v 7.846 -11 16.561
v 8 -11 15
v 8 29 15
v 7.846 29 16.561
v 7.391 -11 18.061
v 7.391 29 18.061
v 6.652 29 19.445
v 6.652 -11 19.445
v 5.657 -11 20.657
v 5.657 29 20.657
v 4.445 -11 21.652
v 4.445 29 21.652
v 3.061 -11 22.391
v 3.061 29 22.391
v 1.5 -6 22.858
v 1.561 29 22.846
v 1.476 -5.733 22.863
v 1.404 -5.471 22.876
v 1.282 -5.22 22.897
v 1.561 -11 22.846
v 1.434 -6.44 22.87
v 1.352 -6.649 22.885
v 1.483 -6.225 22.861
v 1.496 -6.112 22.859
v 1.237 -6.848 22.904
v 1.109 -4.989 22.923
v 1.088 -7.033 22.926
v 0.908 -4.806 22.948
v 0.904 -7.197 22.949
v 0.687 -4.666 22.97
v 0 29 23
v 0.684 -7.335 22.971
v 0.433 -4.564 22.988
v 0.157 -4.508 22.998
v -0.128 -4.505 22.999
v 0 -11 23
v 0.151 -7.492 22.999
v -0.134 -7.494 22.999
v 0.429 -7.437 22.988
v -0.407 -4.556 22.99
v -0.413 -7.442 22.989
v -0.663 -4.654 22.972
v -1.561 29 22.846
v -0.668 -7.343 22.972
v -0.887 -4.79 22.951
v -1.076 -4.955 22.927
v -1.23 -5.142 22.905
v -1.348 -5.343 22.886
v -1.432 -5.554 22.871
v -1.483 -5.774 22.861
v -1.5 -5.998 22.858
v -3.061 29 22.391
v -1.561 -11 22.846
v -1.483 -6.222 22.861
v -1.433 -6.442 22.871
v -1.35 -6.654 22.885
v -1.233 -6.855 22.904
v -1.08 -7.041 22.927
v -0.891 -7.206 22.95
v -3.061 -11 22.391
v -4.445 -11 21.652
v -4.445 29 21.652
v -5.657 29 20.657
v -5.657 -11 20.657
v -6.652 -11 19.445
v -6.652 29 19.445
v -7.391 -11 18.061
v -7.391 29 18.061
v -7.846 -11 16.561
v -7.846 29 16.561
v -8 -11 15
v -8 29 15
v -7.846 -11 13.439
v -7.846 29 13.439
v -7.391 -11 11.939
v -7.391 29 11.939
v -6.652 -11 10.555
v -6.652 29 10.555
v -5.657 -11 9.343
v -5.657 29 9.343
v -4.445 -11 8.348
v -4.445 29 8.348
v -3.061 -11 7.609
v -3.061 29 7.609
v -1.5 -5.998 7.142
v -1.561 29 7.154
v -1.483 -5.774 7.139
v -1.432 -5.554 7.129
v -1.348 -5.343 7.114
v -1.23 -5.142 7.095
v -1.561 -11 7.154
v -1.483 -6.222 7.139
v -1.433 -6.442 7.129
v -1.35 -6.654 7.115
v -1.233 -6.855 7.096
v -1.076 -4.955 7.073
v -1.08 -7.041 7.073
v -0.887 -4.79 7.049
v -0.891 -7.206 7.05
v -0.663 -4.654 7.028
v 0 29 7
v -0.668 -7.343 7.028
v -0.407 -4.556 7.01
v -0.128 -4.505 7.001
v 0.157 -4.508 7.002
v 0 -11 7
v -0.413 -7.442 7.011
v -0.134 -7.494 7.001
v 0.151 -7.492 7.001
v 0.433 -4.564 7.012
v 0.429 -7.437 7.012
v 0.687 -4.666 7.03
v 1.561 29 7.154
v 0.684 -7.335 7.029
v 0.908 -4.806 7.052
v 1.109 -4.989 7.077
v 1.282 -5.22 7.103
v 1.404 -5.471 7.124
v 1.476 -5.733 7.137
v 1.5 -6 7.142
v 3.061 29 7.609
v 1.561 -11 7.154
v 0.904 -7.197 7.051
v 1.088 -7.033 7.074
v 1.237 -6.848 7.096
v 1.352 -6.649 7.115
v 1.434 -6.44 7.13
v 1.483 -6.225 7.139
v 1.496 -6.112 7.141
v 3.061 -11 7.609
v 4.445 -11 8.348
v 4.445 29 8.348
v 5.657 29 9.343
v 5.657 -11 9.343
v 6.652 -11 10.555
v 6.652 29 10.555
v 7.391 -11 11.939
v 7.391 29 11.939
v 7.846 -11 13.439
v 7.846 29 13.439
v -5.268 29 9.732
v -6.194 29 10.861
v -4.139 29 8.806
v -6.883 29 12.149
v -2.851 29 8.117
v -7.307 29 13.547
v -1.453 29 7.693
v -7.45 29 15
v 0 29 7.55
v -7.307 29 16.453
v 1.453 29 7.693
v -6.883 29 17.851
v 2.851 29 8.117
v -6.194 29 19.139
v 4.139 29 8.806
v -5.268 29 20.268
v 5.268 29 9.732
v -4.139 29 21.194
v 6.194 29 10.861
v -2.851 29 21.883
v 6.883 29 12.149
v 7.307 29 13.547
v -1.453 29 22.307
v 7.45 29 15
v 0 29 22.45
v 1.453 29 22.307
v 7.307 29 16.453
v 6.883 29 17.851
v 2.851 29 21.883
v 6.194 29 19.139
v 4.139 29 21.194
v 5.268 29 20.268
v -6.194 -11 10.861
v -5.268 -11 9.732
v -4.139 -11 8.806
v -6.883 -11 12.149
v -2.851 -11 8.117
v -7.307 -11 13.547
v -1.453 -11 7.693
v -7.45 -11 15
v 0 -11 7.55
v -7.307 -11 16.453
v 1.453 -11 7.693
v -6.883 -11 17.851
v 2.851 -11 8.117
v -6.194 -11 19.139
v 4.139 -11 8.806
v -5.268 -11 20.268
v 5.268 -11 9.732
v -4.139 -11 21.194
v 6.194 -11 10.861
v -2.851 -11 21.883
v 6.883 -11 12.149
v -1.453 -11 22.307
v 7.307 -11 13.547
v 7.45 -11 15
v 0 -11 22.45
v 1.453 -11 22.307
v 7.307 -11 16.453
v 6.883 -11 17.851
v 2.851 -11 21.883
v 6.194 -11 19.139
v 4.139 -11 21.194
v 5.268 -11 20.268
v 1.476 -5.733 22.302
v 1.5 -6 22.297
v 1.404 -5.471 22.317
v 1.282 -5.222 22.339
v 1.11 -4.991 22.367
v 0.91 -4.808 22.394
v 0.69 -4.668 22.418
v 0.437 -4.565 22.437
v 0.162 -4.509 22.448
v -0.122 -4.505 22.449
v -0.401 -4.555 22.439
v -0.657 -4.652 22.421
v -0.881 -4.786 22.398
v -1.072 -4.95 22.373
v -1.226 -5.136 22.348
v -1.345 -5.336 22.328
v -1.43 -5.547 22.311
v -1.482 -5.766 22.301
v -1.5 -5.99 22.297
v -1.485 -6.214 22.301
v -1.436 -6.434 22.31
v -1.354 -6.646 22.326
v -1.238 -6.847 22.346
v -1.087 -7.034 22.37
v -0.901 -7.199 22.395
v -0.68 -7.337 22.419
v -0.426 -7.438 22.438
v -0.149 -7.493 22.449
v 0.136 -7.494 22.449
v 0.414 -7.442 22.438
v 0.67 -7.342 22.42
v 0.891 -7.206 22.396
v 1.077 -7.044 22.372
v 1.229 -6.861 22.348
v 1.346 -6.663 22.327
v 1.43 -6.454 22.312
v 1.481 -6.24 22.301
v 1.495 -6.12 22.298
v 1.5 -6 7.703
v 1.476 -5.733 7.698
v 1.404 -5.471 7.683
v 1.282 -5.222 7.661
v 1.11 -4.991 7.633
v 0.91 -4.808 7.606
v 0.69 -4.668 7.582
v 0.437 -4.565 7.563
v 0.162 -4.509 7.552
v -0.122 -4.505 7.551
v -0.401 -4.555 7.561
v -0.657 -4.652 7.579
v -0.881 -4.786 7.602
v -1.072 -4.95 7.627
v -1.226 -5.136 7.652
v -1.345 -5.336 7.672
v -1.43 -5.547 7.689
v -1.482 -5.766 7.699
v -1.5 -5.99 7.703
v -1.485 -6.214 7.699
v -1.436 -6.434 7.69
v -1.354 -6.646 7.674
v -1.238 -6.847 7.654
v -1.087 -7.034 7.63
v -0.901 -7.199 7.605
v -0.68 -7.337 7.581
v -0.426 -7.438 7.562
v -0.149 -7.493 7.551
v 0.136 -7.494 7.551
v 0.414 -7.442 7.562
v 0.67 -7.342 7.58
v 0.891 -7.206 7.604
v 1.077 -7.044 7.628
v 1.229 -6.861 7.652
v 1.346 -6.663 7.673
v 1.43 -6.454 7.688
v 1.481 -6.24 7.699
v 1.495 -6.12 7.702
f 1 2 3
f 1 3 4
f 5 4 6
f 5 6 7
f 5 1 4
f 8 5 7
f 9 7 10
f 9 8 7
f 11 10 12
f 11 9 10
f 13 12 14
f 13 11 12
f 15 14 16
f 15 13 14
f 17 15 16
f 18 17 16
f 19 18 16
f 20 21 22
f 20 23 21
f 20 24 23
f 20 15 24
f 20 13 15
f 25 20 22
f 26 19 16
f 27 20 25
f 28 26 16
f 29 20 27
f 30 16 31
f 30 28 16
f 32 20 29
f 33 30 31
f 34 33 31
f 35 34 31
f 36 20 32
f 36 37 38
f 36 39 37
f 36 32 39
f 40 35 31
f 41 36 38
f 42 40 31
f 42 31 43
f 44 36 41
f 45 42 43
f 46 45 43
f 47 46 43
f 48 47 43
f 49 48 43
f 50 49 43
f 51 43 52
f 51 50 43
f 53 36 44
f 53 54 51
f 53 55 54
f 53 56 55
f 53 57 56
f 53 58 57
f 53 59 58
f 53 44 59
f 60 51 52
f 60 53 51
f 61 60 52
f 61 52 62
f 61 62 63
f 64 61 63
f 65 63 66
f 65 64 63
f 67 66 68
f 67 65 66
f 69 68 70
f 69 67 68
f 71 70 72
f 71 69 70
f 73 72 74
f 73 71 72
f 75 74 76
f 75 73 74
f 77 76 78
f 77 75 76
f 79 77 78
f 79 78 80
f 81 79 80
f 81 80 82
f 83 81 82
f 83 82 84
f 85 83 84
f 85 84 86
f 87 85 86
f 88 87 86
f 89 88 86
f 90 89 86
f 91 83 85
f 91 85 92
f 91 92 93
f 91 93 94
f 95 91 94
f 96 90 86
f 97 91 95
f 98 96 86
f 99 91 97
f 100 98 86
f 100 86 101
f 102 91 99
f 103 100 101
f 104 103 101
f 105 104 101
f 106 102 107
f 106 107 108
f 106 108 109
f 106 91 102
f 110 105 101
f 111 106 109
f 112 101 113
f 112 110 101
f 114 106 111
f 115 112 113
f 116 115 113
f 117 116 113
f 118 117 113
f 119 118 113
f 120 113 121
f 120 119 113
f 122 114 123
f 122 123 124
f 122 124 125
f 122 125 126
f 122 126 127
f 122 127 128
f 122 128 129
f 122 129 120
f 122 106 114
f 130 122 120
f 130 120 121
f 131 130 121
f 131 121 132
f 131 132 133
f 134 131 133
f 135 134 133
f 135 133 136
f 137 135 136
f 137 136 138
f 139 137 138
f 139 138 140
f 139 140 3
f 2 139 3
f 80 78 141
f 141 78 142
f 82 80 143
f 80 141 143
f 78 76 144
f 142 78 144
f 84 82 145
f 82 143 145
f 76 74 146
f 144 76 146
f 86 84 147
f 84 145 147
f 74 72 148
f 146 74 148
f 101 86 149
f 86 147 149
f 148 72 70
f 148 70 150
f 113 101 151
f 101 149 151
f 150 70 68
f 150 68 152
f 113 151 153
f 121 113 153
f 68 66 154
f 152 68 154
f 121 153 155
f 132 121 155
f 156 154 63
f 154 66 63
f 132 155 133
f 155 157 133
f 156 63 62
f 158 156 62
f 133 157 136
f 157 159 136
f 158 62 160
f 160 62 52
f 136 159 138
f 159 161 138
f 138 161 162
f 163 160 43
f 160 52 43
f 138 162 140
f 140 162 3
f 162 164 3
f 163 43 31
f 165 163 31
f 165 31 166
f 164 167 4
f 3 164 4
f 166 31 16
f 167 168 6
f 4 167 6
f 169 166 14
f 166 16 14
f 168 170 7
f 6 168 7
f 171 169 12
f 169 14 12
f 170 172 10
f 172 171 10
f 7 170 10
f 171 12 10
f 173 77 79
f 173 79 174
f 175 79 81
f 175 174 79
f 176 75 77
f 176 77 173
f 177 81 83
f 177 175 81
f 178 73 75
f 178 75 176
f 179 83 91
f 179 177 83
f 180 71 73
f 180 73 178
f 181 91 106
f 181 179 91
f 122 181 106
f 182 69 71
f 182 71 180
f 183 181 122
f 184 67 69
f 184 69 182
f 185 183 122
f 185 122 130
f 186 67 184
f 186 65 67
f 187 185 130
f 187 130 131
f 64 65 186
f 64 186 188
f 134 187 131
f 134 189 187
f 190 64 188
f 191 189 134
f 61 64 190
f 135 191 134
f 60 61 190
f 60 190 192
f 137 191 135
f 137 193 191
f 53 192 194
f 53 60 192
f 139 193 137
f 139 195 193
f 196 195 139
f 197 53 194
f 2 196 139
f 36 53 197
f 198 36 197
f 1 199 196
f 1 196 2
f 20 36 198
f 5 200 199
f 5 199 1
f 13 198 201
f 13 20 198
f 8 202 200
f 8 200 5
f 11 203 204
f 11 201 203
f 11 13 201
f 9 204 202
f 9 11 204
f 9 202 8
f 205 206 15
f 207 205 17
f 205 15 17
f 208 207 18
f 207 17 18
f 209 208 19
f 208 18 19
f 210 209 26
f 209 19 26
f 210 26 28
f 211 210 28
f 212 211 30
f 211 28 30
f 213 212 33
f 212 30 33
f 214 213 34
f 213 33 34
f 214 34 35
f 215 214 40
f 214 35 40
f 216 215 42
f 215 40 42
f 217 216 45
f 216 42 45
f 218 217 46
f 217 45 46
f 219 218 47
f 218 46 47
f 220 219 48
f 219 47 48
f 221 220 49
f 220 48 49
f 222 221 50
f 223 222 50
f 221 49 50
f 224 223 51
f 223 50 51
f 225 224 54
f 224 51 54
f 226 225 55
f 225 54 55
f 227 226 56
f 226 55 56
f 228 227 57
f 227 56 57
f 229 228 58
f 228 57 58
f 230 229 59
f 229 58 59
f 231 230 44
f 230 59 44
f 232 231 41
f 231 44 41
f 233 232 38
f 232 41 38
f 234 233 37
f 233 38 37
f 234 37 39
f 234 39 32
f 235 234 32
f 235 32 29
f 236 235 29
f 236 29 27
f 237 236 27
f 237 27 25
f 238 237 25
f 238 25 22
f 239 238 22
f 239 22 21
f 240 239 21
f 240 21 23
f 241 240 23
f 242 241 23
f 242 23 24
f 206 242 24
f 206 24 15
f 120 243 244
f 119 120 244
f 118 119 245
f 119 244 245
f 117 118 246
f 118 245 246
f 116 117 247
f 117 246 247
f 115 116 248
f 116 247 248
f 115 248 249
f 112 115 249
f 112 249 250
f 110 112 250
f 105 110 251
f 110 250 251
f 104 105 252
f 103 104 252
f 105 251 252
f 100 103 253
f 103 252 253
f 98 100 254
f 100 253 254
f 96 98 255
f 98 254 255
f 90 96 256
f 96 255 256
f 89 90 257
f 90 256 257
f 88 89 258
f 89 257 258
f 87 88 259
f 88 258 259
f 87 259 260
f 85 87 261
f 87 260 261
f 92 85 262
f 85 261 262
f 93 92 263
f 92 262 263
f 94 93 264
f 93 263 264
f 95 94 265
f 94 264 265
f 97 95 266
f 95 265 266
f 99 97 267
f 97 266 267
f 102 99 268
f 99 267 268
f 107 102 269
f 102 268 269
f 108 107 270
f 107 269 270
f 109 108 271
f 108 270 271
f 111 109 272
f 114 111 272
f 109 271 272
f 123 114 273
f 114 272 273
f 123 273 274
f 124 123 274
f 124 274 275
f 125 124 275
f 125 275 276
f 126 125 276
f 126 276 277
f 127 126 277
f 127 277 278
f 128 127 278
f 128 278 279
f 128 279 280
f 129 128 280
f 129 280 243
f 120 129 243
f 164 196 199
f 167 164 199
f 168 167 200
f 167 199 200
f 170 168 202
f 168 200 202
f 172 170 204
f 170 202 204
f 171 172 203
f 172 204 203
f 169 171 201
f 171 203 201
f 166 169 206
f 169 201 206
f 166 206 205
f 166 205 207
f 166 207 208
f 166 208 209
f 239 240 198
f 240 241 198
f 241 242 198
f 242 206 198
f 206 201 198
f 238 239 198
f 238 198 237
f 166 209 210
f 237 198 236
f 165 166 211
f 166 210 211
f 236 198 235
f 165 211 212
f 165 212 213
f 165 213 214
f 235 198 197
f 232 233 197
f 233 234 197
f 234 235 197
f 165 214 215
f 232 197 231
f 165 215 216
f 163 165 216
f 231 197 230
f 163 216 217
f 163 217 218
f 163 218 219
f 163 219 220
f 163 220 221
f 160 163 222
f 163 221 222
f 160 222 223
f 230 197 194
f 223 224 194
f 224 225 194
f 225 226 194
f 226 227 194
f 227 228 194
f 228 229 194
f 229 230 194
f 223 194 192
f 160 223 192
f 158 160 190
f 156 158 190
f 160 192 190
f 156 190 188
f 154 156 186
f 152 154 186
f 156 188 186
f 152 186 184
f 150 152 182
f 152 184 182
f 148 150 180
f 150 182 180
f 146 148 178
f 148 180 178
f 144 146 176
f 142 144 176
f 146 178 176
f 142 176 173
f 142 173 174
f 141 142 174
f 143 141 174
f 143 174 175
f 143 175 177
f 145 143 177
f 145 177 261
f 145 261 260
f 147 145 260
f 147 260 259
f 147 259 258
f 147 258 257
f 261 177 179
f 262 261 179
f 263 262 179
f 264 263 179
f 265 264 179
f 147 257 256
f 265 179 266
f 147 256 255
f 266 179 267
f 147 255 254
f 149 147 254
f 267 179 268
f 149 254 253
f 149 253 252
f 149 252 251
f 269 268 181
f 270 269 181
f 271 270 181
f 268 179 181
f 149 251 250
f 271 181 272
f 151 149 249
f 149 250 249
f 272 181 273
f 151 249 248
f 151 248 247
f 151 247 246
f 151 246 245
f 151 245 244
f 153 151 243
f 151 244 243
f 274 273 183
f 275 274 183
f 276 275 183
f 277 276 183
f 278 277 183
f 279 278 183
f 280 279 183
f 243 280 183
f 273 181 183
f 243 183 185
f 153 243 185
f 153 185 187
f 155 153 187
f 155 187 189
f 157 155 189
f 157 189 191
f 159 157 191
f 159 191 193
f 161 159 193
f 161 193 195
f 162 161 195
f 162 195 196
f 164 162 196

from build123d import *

# Parameters (mm, degrees)
SKETCH003_R     = 8
PAD003_DEPTH    = 40
SKETCH004_R     = 1.5
POCKET_DEPTH    = 13.5
SKETCH005_R     = 7.45
POCKET001_DEPTH = 40.001


with BuildPart() as part:
    # Sketch003 → Pad003 (new body)
    with BuildSketch(Plane.XZ):
        with Locations((0, 15)):
            Circle(SKETCH003_R)
    extrude(amount=-PAD003_DEPTH)

    # Sketch004 (on DatumPlane) → Pocket (cut, symmetric)
    with BuildSketch(Plane.XY.offset(15)):
        with Locations((0, 5)):
            Circle(SKETCH004_R)
    extrude(amount=POCKET_DEPTH, both=True, mode=Mode.SUBTRACT)

    # Sketch005 → Pocket001 (cut, through all)
    with BuildSketch(Plane.XZ):
        with Locations((0, 15)):
            Circle(SKETCH005_R)
    extrude(amount=-POCKET001_DEPTH, mode=Mode.SUBTRACT)


with BuildPart() as part_1:
    # Body003 placement: moved
    add(part.part.moved(Location((0, -11, 0))))


solid = part_1.part
